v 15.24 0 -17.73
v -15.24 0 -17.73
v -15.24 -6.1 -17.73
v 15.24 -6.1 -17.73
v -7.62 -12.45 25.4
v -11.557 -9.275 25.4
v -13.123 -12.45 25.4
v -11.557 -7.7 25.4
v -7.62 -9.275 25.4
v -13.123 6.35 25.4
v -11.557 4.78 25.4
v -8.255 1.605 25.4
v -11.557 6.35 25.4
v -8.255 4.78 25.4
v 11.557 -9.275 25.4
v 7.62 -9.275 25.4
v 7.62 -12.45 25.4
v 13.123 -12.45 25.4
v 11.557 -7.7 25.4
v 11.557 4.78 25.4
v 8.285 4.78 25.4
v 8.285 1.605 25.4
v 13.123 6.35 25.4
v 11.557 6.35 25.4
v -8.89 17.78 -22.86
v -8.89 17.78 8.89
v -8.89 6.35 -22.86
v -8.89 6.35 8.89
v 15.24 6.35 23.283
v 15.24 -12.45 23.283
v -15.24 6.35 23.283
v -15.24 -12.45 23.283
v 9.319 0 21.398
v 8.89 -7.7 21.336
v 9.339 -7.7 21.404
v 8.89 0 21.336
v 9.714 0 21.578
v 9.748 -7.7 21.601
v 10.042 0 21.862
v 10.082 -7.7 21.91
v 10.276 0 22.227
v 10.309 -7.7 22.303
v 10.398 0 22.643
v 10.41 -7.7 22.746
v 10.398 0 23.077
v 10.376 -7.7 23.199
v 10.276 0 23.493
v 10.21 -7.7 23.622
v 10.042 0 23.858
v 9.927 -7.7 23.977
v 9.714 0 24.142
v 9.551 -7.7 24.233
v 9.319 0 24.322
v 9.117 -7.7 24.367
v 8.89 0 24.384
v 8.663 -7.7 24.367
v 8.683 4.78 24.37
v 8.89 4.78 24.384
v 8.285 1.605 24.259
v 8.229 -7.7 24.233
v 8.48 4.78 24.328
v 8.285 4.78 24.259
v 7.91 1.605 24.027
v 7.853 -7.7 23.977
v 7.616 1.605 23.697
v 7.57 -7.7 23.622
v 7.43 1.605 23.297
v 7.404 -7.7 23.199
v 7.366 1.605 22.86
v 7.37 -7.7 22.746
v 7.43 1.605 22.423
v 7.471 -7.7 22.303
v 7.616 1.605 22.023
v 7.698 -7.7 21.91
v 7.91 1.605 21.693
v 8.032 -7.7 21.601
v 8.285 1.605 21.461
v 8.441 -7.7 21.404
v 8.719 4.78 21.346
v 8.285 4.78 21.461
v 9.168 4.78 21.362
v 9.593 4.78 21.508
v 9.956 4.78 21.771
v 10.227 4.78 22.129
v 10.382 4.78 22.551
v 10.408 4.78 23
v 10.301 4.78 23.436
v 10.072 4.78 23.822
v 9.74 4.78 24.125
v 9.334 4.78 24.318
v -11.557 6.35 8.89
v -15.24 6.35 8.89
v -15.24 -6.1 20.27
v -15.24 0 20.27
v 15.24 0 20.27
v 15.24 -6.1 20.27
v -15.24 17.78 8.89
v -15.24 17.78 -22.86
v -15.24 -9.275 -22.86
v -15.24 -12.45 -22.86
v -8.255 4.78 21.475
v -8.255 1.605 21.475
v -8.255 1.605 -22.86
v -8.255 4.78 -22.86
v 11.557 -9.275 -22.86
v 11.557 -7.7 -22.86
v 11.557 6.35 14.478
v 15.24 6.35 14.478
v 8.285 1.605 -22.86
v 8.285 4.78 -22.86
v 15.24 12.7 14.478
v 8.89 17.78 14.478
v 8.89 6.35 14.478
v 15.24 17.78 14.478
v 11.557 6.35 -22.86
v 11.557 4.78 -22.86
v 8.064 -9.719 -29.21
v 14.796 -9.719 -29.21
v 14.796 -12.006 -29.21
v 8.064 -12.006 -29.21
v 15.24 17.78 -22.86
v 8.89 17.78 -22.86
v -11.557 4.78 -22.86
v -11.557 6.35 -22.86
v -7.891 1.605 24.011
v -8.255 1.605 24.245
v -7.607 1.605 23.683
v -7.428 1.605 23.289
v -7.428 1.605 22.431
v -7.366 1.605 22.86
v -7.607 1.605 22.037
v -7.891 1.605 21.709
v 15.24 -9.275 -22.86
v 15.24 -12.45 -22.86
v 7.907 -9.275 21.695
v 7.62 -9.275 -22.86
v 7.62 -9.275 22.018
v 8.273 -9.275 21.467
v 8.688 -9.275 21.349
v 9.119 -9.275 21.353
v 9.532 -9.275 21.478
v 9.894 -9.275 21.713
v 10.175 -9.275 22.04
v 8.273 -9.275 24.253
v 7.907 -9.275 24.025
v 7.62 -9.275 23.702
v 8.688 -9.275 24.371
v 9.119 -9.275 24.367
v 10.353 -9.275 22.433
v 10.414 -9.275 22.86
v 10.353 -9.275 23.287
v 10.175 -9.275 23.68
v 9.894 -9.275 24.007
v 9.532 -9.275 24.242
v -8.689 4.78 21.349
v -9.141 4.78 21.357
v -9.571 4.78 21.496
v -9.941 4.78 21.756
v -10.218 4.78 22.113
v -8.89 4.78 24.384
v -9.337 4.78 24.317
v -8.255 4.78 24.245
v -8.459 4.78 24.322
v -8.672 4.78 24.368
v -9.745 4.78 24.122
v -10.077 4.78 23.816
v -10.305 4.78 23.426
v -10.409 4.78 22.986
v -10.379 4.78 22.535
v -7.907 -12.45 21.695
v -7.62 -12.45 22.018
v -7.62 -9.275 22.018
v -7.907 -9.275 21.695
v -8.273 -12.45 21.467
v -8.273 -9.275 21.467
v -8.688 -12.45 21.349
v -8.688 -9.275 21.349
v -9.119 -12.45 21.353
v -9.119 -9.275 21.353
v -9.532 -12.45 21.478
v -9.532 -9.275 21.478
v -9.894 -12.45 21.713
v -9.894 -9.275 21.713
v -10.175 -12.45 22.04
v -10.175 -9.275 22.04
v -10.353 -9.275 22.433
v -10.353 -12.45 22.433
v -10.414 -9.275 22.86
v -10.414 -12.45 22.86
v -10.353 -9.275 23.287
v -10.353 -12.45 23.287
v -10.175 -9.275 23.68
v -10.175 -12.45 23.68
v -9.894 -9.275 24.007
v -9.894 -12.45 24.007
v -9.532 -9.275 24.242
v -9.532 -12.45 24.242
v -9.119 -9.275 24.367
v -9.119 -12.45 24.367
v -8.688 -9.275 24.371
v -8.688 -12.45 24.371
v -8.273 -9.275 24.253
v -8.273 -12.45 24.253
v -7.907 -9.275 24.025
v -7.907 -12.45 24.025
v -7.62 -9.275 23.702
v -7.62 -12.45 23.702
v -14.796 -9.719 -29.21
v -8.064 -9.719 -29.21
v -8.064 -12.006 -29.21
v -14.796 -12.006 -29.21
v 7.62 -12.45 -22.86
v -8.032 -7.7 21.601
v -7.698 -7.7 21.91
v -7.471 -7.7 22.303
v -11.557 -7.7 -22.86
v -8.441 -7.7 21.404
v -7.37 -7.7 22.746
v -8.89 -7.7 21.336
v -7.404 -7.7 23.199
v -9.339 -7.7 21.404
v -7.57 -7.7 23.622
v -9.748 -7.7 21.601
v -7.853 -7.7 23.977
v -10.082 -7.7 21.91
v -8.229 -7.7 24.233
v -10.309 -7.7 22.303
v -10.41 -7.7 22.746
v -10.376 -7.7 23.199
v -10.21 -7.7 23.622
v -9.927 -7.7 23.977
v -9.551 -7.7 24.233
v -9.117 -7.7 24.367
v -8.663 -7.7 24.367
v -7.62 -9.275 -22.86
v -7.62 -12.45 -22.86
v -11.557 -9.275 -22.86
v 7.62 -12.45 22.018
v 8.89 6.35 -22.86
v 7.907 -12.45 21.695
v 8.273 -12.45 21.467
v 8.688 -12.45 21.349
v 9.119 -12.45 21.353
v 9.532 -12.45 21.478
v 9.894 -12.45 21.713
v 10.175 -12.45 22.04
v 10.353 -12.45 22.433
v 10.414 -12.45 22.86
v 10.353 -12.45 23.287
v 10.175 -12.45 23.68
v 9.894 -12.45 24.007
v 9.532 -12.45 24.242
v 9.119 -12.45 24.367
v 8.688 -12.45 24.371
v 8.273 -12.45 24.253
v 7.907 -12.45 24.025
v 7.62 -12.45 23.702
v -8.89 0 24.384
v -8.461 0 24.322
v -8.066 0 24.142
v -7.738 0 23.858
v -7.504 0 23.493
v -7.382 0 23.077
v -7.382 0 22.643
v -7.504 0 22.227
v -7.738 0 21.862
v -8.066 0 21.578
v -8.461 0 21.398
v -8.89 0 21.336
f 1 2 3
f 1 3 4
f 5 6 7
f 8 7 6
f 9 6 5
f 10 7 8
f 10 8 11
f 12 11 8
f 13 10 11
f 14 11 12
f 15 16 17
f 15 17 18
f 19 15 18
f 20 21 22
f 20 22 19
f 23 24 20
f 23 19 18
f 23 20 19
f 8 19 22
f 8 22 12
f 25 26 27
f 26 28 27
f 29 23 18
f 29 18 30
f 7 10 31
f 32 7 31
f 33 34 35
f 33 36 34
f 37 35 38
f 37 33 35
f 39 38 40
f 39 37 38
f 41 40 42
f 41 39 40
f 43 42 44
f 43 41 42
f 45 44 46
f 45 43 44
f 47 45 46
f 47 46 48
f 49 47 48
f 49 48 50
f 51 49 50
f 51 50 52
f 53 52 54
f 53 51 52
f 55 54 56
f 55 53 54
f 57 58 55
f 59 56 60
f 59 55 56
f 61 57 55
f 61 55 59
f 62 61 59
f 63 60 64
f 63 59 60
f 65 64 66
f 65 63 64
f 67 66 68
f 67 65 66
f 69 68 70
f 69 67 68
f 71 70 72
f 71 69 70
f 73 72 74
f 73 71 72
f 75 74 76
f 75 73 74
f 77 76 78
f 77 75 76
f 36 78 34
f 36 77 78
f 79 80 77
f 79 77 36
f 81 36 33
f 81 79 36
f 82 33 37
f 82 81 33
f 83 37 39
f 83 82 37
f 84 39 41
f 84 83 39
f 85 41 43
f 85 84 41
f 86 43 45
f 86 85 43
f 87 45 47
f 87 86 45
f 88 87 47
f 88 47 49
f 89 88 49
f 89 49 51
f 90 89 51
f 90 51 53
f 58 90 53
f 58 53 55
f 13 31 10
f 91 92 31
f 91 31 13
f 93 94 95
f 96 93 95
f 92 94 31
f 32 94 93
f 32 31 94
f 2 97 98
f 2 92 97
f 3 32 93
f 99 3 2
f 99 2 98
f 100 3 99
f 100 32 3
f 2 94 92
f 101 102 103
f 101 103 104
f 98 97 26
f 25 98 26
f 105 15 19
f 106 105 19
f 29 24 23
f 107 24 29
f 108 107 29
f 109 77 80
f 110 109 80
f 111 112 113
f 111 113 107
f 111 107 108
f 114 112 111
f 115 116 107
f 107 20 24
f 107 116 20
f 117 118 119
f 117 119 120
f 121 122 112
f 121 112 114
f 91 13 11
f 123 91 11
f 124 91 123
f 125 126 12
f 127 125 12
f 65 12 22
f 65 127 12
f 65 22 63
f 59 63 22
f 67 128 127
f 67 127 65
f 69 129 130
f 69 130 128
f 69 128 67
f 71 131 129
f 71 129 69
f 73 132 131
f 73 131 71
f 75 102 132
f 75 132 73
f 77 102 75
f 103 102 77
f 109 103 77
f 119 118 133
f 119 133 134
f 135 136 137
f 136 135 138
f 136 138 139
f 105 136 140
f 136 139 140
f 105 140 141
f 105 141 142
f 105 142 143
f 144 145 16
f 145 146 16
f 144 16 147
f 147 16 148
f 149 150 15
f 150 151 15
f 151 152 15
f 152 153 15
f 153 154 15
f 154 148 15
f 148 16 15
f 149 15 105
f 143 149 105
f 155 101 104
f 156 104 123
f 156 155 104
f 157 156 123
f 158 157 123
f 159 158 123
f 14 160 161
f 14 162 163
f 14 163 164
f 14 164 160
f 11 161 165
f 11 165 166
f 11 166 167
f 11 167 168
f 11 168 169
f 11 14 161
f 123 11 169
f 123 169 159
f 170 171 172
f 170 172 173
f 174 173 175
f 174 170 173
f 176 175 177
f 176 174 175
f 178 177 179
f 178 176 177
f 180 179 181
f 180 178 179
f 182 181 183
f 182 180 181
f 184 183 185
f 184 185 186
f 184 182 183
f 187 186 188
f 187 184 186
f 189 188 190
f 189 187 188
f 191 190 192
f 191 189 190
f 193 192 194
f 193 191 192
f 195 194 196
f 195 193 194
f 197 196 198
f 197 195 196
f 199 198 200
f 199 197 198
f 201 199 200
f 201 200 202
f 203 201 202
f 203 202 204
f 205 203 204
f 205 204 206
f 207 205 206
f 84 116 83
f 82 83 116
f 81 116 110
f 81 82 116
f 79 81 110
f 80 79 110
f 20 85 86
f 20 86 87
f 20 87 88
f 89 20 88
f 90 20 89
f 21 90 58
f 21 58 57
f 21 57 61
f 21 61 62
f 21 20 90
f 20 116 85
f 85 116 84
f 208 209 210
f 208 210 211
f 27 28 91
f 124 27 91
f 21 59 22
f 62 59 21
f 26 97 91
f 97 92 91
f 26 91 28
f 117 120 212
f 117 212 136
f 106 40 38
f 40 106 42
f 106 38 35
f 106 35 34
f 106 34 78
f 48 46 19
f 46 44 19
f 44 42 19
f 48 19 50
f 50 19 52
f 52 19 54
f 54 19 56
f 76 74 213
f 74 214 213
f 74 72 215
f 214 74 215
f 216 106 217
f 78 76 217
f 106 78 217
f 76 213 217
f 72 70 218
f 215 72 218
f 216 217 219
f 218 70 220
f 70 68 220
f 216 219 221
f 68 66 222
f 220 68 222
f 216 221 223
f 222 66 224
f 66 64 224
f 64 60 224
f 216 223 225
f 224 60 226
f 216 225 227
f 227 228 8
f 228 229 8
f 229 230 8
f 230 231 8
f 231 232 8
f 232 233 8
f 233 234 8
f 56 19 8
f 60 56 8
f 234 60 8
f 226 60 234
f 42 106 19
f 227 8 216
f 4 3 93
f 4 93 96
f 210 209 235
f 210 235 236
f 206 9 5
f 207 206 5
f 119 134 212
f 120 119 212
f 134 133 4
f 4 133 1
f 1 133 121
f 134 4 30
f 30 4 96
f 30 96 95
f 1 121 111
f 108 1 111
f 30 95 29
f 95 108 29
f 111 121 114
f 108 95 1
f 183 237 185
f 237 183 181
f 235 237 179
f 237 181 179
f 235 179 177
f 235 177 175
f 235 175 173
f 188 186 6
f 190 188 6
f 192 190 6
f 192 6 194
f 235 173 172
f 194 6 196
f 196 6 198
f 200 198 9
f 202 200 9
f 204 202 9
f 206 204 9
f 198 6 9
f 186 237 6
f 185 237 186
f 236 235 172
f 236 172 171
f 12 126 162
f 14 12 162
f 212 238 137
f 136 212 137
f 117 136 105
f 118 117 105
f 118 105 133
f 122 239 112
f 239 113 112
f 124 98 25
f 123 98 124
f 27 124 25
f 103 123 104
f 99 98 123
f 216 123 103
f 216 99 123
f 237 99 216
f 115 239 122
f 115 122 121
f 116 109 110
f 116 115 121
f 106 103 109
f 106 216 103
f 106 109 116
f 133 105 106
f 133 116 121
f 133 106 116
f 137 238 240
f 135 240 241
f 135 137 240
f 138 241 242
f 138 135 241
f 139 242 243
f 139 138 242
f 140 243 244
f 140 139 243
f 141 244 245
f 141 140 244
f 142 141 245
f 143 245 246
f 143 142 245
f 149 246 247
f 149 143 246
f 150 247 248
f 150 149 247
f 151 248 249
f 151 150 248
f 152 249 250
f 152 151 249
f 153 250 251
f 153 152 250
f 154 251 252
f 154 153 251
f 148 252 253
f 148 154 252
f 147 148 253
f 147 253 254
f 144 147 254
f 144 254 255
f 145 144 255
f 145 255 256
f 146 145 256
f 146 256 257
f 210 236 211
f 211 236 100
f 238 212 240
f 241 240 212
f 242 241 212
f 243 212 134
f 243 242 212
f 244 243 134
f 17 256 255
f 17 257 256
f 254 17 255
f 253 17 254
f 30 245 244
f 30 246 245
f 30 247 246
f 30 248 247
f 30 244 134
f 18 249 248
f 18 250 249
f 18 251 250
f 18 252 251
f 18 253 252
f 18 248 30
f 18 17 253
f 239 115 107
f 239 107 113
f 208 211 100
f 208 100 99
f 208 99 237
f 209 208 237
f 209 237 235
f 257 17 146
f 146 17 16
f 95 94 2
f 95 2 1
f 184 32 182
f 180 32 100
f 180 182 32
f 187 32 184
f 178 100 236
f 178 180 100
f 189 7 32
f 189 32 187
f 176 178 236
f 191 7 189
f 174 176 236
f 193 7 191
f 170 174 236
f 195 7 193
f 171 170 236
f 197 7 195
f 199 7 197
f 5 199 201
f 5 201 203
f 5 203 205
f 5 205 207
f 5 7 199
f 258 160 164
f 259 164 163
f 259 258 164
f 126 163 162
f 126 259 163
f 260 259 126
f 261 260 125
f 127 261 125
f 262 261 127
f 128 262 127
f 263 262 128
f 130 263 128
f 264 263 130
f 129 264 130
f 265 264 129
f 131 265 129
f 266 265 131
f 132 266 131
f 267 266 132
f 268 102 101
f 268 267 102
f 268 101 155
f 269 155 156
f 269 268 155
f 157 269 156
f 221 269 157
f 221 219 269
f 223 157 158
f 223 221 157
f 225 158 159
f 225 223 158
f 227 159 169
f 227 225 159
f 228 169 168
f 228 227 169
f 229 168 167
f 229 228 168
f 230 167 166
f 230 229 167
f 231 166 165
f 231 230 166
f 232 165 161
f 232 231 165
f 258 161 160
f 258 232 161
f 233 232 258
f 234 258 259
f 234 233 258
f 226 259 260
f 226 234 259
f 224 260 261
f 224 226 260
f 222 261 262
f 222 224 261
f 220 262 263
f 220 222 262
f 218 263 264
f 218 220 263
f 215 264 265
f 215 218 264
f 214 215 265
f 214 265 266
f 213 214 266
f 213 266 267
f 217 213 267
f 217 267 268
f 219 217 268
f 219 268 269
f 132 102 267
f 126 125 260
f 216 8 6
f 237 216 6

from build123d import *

# Parameters (mm, degrees)
SKETCH1_W                     = 30.48
SKETCH1_H                     = 50.8
SKETCH1_R                     = 1.524
BOSS_EXTRUDE1_DEPTH           = 12.7
CUT_EXTRUDE1_DEPTH            = 55.536112806
SKETCH3_W                     = 13.253769435
SKETCH3_H                     = 10.922
CUT_EXTRUDE2_DEPTH            = 6.35
SKETCH4_W                     = 23.114
SKETCH4_H                     = 19.05
CUT_EXTRUDE3_DEPTH            = 3.175
CUT_EXTRUDE4_DEPTH            = 2.54
SKETCH7_W                     = 3.272
SKETCH7_H                     = 3.175
SKETCH7_W_2                   = 3.302
BOSS_EXTRUDE2_DEPTH           = 16.51
SKETCH8_W                     = 16.54
SKETCH8_H                     = 3.175
CUT_EXTRUDE5_DEPTH            = 38.438083551
CUT_EXTRUDE5_DEPTH_BACK       = 38.438083551
SKETCH9_W                     = 30.48
SKETCH9_H                     = 5.13
SKETCH9_R                     = 1.524
BOSS_EXTRUDE3_DEPTH           = 6.1
SKETCH10_W                    = 30.48
SKETCH10_H                    = 48.26
SKETCH10_R                    = 1.524
BOSS_EXTRUDE4_DEPTH           = 6.35
CUT_EXTRUDE7_DEPTH            = 53.178302004
CUT_EXTRUDE7_DEPTH_BACK       = 53.178302004
BOSS_EXTRUDE5_DEPTH           = 6.35
BOSS_EXTRUDE5_DRAFT           = 4
BOSS_EXTRUDE5_PROFILE_2_DEPTH = 6.35
BOSS_EXTRUDE5_PROFILE_2_DRAFT = 4
CUT_EXTRUDE8_DEPTH            = 42.448814217
SKETCH14_W                    = 6.35
SKETCH14_H                    = 31.75
SKETCH14_H_2                  = 37.338
BOSS_EXTRUDE6_DEPTH           = 5.08


with BuildPart() as part:
    # Sketch1 → Boss-Extrude1 (new body)
    with BuildSketch(Plane(origin=(0, 0, 0), x_dir=(1, 0, 0), z_dir=(0, 1, 0))):
        Rectangle(SKETCH1_W, SKETCH1_H)
        with Locations(Location((8.89, -22.86, 0), (0, 0, 270))):
            Circle(SKETCH1_R, mode=Mode.SUBTRACT)
        with Locations(Location((-8.89, -22.86, 0), (0, 0, 270))):
            Circle(SKETCH1_R, mode=Mode.SUBTRACT)
        with Locations((8.89, 22.86)):
            Circle(SKETCH1_R, mode=Mode.SUBTRACT)
        with Locations((-8.89, 22.86)):
            Circle(SKETCH1_R, mode=Mode.SUBTRACT)
        with Locations((8.89, 22.86)):
            Circle(SKETCH1_R)
        with Locations((-8.89, 22.86)):
            Circle(SKETCH1_R)
    extrude(amount=BOSS_EXTRUDE1_DEPTH)

    # Sketch2 → Cut-Extrude1 (cut, through all)
    with BuildSketch(Plane.XY.offset(25.4)):
        Polygon((8.89, 12.7), (-8.89, 12.7), (-8.89, 6.35), (-11.557, 6.35), (-11.557, 4.78), (11.557, 4.78), (11.557, 6.35), (8.89, 6.35), align=None)
    extrude(amount=-CUT_EXTRUDE1_DEPTH, mode=Mode.SUBTRACT)

    # Sketch3 → Cut-Extrude2 (cut)
    with BuildSketch(Plane(origin=(0, 12.7, 0), x_dir=(1, 0, 0), z_dir=(0, 1, 0))):
        Polygon((-15.24, -8.89), (-15.24, -25.4), (1.986230565, -25.4), (1.986230565, -14.478), (1.986230565, -8.89), align=None)
        with Locations((8.613115283, -19.939)):
            Rectangle(SKETCH3_W, SKETCH3_H)
    extrude(amount=-CUT_EXTRUDE2_DEPTH, mode=Mode.SUBTRACT)

    # Sketch4 → Cut-Extrude3 (cut)
    with BuildSketch(Plane(origin=(0, 4.78, 0), x_dir=(1, 0, 0), z_dir=(0, 1, 0))):
        with Locations((0, 15.875)):
            Rectangle(SKETCH4_W, SKETCH4_H)
    extrude(amount=-CUT_EXTRUDE3_DEPTH, mode=Mode.SUBTRACT)

    # Sketch6 → Cut-Extrude4 (cut)
    with BuildSketch(Plane(origin=(0, 0, -25.4), x_dir=(-1, 0, 0), z_dir=(0, 0, -1))):
        Polygon((11.557, 6.35), (11.557, 1.605), (-11.557, 1.605), (-11.557, 6.35), (-8.89, 6.35), (-8.89, 12.7), (-15.24, 12.7), (-15.24, 0), (15.24, 0), (15.24, 12.7), (8.89, 12.7), (8.89, 6.35), align=None)
    extrude(amount=-CUT_EXTRUDE4_DEPTH, mode=Mode.SUBTRACT)

    # Sketch7 → Boss-Extrude2 (add)
    with BuildSketch(Plane(origin=(0, 0, -6.35), x_dir=(-1, 0, 0), z_dir=(0, 0, -1))):
        with Locations((-9.921, 3.1925)):
            Rectangle(SKETCH7_W, SKETCH7_H)
        with Locations((9.906, 3.1925)):
            Rectangle(SKETCH7_W_2, SKETCH7_H)
    extrude(amount=BOSS_EXTRUDE2_DEPTH)

    # Sketch8 → Cut-Extrude5 (cut, two sides)
    with BuildSketch(Plane(origin=(0, 0, -6.35), x_dir=(-1, 0, 0), z_dir=(0, 0, -1))) as cut_extrude5_sk:
        with Locations((-0.015, 3.1925)):
            Rectangle(SKETCH8_W, SKETCH8_H)
    extrude(amount=CUT_EXTRUDE5_DEPTH, mode=Mode.SUBTRACT)
    extrude(cut_extrude5_sk.sketch, amount=-CUT_EXTRUDE5_DEPTH_BACK, mode=Mode.SUBTRACT)

    # Sketch9 → Boss-Extrude3 (add)
    with BuildSketch(Plane.XZ):
        with Locations((0, 22.835)):
            Rectangle(SKETCH9_W, SKETCH9_H)
        with Locations(Location((-8.89, 22.86, 0), (0, 0, 270))):
            Circle(SKETCH9_R, mode=Mode.SUBTRACT)
        with Locations(Location((8.89, 22.86, 0), (0, 0, 270))):
            Circle(SKETCH9_R, mode=Mode.SUBTRACT)
        with Locations((0, -20.295)):
            Rectangle(SKETCH9_W, SKETCH9_H)
    extrude(amount=BOSS_EXTRUDE3_DEPTH)

    # Sketch10 → Boss-Extrude4 (add)
    with BuildSketch(Plane.XZ.offset(6.1)):
        with Locations((0, 1.27)):
            Rectangle(SKETCH10_W, SKETCH10_H)
        with Locations(Location((8.89, 22.86, 0), (0, 0, 270))):
            Circle(SKETCH10_R, mode=Mode.SUBTRACT)
        with Locations(Location((-8.89, 22.86, 0), (0, 0, 270))):
            Circle(SKETCH10_R, mode=Mode.SUBTRACT)
    extrude(amount=BOSS_EXTRUDE4_DEPTH)

    # Sketch11 → Cut-Extrude7 (cut, two sides)
    with BuildSketch(Plane.XY.offset(25.4)) as cut_extrude7_sk:
        Polygon((-7.62, -12.45), (0, -12.45), (0, -7.7002), (-11.557, -7.7002), (-11.557, -9.275), (-7.62, -9.275), align=None)
        Polygon((0, -7.7002), (0, -12.45), (7.62, -12.45), (7.62, -9.275), (11.557, -9.275), (11.557, -7.7002), align=None)
    extrude(amount=CUT_EXTRUDE7_DEPTH, mode=Mode.SUBTRACT)
    extrude(cut_extrude7_sk.sketch, amount=-CUT_EXTRUDE7_DEPTH_BACK, mode=Mode.SUBTRACT)


with BuildPart() as boss_extrude5_tool:
    # Sketch12 → Boss-Extrude5 (with draft: the straight prism first)
    with BuildSketch(Plane(origin=(0, 0, -22.86), x_dir=(-1, 0, 0), z_dir=(0, 0, -1))):
        Polygon((-7.62, -12.45), (-7.62, -9.275), (-11.557, -9.275), (-15.24, -9.275), (-15.24, -12.45), align=None)
    extrude(amount=BOSS_EXTRUDE5_DEPTH)
    # Boss-Extrude5: the draft: its side faces are tilted about the plane it starts from
    boss_extrude5_sides = [boss_extrude5_tool.faces().sort_by_distance(p)[0] for p in [
        (7.62, -10.8625, -26.035),
        (15.24, -10.8625, -26.035),
        (11.43, -9.275, -26.035),
        (11.43, -12.45, -26.035),
    ]]
    draft(boss_extrude5_sides, Plane(origin=(0, 0, -22.86), x_dir=(-1, 0, 0), z_dir=(0, 0, -1)), BOSS_EXTRUDE5_DRAFT)


with BuildPart() as part_1:
    add(part.part)

    # Boss-Extrude5: add boss_extrude5_tool
    add(boss_extrude5_tool.part)


with BuildPart() as boss_extrude5_profile_2_tool:
    # Sketch12 → Boss-Extrude5 profile 2 (with draft: the straight prism first)
    with BuildSketch(Plane(origin=(0, 0, -22.86), x_dir=(-1, 0, 0), z_dir=(0, 0, -1))):
        Polygon((15.24, -12.45), (15.24, -9.275), (11.557, -9.275), (7.62, -9.275), (7.62, -12.45), align=None)
    extrude(amount=BOSS_EXTRUDE5_PROFILE_2_DEPTH)
    # Boss-Extrude5 profile 2: the draft: its side faces are tilted about the plane it starts from
    boss_extrude5_profile_2_sides = [boss_extrude5_profile_2_tool.faces().sort_by_distance(p)[0] for p in [
        (-11.43, -12.45, -26.035),
        (-11.43, -9.275, -26.035),
        (-15.24, -10.8625, -26.035),
        (-7.62, -10.8625, -26.035),
    ]]
    draft(boss_extrude5_profile_2_sides, Plane(origin=(0, 0, -22.86), x_dir=(-1, 0, 0), z_dir=(0, 0, -1)), BOSS_EXTRUDE5_PROFILE_2_DRAFT)


with BuildPart() as part_2:
    add(part_1.part)

    # Boss-Extrude5 profile 2: add boss_extrude5_profile_2_tool
    add(boss_extrude5_profile_2_tool.part)

    # Sketch13 → Cut-Extrude8 (cut, through all)
    with BuildSketch(Plane.XZ.offset(12.45)):
        Polygon((-22.129268927, 18.728628624), (-23.925320151, 20.524679849), (-15.843089642, 28.606910358), (-14.047038418, 26.810859133), (-11.837895412, 29.020002139), (-10.670462117, 27.852568843), (-23.170978637, 15.352052323), (-24.338411933, 16.519485619), align=None)
        Polygon((23.170978637, 15.352052323), (24.338411933, 16.519485619), (22.129268927, 18.728628624), (23.925320151, 20.524679849), (15.843089642, 28.606910358), (14.047038418, 26.810859133), (11.837895412, 29.020002139), (10.670462117, 27.852568843), (13.12303096, 25.4), (15.24, 25.4), (15.24, 23.28303096), align=None)
        Polygon((13.12303096, 25.4), (15.24, 23.28303096), (15.24, 25.4), align=None)
    extrude(amount=-CUT_EXTRUDE8_DEPTH, mode=Mode.SUBTRACT)

    # Sketch14 → Boss-Extrude6 (add)
    with BuildSketch(Plane(origin=(0, 12.7, 0), x_dir=(1, 0, 0), z_dir=(0, 1, 0))):
        with Locations((-12.065, 6.985)):
            Rectangle(SKETCH14_W, SKETCH14_H)
        with Locations((12.065, 4.191)):
            Rectangle(SKETCH14_W, SKETCH14_H_2)
    extrude(amount=BOSS_EXTRUDE6_DEPTH)


solid = part_2.part
